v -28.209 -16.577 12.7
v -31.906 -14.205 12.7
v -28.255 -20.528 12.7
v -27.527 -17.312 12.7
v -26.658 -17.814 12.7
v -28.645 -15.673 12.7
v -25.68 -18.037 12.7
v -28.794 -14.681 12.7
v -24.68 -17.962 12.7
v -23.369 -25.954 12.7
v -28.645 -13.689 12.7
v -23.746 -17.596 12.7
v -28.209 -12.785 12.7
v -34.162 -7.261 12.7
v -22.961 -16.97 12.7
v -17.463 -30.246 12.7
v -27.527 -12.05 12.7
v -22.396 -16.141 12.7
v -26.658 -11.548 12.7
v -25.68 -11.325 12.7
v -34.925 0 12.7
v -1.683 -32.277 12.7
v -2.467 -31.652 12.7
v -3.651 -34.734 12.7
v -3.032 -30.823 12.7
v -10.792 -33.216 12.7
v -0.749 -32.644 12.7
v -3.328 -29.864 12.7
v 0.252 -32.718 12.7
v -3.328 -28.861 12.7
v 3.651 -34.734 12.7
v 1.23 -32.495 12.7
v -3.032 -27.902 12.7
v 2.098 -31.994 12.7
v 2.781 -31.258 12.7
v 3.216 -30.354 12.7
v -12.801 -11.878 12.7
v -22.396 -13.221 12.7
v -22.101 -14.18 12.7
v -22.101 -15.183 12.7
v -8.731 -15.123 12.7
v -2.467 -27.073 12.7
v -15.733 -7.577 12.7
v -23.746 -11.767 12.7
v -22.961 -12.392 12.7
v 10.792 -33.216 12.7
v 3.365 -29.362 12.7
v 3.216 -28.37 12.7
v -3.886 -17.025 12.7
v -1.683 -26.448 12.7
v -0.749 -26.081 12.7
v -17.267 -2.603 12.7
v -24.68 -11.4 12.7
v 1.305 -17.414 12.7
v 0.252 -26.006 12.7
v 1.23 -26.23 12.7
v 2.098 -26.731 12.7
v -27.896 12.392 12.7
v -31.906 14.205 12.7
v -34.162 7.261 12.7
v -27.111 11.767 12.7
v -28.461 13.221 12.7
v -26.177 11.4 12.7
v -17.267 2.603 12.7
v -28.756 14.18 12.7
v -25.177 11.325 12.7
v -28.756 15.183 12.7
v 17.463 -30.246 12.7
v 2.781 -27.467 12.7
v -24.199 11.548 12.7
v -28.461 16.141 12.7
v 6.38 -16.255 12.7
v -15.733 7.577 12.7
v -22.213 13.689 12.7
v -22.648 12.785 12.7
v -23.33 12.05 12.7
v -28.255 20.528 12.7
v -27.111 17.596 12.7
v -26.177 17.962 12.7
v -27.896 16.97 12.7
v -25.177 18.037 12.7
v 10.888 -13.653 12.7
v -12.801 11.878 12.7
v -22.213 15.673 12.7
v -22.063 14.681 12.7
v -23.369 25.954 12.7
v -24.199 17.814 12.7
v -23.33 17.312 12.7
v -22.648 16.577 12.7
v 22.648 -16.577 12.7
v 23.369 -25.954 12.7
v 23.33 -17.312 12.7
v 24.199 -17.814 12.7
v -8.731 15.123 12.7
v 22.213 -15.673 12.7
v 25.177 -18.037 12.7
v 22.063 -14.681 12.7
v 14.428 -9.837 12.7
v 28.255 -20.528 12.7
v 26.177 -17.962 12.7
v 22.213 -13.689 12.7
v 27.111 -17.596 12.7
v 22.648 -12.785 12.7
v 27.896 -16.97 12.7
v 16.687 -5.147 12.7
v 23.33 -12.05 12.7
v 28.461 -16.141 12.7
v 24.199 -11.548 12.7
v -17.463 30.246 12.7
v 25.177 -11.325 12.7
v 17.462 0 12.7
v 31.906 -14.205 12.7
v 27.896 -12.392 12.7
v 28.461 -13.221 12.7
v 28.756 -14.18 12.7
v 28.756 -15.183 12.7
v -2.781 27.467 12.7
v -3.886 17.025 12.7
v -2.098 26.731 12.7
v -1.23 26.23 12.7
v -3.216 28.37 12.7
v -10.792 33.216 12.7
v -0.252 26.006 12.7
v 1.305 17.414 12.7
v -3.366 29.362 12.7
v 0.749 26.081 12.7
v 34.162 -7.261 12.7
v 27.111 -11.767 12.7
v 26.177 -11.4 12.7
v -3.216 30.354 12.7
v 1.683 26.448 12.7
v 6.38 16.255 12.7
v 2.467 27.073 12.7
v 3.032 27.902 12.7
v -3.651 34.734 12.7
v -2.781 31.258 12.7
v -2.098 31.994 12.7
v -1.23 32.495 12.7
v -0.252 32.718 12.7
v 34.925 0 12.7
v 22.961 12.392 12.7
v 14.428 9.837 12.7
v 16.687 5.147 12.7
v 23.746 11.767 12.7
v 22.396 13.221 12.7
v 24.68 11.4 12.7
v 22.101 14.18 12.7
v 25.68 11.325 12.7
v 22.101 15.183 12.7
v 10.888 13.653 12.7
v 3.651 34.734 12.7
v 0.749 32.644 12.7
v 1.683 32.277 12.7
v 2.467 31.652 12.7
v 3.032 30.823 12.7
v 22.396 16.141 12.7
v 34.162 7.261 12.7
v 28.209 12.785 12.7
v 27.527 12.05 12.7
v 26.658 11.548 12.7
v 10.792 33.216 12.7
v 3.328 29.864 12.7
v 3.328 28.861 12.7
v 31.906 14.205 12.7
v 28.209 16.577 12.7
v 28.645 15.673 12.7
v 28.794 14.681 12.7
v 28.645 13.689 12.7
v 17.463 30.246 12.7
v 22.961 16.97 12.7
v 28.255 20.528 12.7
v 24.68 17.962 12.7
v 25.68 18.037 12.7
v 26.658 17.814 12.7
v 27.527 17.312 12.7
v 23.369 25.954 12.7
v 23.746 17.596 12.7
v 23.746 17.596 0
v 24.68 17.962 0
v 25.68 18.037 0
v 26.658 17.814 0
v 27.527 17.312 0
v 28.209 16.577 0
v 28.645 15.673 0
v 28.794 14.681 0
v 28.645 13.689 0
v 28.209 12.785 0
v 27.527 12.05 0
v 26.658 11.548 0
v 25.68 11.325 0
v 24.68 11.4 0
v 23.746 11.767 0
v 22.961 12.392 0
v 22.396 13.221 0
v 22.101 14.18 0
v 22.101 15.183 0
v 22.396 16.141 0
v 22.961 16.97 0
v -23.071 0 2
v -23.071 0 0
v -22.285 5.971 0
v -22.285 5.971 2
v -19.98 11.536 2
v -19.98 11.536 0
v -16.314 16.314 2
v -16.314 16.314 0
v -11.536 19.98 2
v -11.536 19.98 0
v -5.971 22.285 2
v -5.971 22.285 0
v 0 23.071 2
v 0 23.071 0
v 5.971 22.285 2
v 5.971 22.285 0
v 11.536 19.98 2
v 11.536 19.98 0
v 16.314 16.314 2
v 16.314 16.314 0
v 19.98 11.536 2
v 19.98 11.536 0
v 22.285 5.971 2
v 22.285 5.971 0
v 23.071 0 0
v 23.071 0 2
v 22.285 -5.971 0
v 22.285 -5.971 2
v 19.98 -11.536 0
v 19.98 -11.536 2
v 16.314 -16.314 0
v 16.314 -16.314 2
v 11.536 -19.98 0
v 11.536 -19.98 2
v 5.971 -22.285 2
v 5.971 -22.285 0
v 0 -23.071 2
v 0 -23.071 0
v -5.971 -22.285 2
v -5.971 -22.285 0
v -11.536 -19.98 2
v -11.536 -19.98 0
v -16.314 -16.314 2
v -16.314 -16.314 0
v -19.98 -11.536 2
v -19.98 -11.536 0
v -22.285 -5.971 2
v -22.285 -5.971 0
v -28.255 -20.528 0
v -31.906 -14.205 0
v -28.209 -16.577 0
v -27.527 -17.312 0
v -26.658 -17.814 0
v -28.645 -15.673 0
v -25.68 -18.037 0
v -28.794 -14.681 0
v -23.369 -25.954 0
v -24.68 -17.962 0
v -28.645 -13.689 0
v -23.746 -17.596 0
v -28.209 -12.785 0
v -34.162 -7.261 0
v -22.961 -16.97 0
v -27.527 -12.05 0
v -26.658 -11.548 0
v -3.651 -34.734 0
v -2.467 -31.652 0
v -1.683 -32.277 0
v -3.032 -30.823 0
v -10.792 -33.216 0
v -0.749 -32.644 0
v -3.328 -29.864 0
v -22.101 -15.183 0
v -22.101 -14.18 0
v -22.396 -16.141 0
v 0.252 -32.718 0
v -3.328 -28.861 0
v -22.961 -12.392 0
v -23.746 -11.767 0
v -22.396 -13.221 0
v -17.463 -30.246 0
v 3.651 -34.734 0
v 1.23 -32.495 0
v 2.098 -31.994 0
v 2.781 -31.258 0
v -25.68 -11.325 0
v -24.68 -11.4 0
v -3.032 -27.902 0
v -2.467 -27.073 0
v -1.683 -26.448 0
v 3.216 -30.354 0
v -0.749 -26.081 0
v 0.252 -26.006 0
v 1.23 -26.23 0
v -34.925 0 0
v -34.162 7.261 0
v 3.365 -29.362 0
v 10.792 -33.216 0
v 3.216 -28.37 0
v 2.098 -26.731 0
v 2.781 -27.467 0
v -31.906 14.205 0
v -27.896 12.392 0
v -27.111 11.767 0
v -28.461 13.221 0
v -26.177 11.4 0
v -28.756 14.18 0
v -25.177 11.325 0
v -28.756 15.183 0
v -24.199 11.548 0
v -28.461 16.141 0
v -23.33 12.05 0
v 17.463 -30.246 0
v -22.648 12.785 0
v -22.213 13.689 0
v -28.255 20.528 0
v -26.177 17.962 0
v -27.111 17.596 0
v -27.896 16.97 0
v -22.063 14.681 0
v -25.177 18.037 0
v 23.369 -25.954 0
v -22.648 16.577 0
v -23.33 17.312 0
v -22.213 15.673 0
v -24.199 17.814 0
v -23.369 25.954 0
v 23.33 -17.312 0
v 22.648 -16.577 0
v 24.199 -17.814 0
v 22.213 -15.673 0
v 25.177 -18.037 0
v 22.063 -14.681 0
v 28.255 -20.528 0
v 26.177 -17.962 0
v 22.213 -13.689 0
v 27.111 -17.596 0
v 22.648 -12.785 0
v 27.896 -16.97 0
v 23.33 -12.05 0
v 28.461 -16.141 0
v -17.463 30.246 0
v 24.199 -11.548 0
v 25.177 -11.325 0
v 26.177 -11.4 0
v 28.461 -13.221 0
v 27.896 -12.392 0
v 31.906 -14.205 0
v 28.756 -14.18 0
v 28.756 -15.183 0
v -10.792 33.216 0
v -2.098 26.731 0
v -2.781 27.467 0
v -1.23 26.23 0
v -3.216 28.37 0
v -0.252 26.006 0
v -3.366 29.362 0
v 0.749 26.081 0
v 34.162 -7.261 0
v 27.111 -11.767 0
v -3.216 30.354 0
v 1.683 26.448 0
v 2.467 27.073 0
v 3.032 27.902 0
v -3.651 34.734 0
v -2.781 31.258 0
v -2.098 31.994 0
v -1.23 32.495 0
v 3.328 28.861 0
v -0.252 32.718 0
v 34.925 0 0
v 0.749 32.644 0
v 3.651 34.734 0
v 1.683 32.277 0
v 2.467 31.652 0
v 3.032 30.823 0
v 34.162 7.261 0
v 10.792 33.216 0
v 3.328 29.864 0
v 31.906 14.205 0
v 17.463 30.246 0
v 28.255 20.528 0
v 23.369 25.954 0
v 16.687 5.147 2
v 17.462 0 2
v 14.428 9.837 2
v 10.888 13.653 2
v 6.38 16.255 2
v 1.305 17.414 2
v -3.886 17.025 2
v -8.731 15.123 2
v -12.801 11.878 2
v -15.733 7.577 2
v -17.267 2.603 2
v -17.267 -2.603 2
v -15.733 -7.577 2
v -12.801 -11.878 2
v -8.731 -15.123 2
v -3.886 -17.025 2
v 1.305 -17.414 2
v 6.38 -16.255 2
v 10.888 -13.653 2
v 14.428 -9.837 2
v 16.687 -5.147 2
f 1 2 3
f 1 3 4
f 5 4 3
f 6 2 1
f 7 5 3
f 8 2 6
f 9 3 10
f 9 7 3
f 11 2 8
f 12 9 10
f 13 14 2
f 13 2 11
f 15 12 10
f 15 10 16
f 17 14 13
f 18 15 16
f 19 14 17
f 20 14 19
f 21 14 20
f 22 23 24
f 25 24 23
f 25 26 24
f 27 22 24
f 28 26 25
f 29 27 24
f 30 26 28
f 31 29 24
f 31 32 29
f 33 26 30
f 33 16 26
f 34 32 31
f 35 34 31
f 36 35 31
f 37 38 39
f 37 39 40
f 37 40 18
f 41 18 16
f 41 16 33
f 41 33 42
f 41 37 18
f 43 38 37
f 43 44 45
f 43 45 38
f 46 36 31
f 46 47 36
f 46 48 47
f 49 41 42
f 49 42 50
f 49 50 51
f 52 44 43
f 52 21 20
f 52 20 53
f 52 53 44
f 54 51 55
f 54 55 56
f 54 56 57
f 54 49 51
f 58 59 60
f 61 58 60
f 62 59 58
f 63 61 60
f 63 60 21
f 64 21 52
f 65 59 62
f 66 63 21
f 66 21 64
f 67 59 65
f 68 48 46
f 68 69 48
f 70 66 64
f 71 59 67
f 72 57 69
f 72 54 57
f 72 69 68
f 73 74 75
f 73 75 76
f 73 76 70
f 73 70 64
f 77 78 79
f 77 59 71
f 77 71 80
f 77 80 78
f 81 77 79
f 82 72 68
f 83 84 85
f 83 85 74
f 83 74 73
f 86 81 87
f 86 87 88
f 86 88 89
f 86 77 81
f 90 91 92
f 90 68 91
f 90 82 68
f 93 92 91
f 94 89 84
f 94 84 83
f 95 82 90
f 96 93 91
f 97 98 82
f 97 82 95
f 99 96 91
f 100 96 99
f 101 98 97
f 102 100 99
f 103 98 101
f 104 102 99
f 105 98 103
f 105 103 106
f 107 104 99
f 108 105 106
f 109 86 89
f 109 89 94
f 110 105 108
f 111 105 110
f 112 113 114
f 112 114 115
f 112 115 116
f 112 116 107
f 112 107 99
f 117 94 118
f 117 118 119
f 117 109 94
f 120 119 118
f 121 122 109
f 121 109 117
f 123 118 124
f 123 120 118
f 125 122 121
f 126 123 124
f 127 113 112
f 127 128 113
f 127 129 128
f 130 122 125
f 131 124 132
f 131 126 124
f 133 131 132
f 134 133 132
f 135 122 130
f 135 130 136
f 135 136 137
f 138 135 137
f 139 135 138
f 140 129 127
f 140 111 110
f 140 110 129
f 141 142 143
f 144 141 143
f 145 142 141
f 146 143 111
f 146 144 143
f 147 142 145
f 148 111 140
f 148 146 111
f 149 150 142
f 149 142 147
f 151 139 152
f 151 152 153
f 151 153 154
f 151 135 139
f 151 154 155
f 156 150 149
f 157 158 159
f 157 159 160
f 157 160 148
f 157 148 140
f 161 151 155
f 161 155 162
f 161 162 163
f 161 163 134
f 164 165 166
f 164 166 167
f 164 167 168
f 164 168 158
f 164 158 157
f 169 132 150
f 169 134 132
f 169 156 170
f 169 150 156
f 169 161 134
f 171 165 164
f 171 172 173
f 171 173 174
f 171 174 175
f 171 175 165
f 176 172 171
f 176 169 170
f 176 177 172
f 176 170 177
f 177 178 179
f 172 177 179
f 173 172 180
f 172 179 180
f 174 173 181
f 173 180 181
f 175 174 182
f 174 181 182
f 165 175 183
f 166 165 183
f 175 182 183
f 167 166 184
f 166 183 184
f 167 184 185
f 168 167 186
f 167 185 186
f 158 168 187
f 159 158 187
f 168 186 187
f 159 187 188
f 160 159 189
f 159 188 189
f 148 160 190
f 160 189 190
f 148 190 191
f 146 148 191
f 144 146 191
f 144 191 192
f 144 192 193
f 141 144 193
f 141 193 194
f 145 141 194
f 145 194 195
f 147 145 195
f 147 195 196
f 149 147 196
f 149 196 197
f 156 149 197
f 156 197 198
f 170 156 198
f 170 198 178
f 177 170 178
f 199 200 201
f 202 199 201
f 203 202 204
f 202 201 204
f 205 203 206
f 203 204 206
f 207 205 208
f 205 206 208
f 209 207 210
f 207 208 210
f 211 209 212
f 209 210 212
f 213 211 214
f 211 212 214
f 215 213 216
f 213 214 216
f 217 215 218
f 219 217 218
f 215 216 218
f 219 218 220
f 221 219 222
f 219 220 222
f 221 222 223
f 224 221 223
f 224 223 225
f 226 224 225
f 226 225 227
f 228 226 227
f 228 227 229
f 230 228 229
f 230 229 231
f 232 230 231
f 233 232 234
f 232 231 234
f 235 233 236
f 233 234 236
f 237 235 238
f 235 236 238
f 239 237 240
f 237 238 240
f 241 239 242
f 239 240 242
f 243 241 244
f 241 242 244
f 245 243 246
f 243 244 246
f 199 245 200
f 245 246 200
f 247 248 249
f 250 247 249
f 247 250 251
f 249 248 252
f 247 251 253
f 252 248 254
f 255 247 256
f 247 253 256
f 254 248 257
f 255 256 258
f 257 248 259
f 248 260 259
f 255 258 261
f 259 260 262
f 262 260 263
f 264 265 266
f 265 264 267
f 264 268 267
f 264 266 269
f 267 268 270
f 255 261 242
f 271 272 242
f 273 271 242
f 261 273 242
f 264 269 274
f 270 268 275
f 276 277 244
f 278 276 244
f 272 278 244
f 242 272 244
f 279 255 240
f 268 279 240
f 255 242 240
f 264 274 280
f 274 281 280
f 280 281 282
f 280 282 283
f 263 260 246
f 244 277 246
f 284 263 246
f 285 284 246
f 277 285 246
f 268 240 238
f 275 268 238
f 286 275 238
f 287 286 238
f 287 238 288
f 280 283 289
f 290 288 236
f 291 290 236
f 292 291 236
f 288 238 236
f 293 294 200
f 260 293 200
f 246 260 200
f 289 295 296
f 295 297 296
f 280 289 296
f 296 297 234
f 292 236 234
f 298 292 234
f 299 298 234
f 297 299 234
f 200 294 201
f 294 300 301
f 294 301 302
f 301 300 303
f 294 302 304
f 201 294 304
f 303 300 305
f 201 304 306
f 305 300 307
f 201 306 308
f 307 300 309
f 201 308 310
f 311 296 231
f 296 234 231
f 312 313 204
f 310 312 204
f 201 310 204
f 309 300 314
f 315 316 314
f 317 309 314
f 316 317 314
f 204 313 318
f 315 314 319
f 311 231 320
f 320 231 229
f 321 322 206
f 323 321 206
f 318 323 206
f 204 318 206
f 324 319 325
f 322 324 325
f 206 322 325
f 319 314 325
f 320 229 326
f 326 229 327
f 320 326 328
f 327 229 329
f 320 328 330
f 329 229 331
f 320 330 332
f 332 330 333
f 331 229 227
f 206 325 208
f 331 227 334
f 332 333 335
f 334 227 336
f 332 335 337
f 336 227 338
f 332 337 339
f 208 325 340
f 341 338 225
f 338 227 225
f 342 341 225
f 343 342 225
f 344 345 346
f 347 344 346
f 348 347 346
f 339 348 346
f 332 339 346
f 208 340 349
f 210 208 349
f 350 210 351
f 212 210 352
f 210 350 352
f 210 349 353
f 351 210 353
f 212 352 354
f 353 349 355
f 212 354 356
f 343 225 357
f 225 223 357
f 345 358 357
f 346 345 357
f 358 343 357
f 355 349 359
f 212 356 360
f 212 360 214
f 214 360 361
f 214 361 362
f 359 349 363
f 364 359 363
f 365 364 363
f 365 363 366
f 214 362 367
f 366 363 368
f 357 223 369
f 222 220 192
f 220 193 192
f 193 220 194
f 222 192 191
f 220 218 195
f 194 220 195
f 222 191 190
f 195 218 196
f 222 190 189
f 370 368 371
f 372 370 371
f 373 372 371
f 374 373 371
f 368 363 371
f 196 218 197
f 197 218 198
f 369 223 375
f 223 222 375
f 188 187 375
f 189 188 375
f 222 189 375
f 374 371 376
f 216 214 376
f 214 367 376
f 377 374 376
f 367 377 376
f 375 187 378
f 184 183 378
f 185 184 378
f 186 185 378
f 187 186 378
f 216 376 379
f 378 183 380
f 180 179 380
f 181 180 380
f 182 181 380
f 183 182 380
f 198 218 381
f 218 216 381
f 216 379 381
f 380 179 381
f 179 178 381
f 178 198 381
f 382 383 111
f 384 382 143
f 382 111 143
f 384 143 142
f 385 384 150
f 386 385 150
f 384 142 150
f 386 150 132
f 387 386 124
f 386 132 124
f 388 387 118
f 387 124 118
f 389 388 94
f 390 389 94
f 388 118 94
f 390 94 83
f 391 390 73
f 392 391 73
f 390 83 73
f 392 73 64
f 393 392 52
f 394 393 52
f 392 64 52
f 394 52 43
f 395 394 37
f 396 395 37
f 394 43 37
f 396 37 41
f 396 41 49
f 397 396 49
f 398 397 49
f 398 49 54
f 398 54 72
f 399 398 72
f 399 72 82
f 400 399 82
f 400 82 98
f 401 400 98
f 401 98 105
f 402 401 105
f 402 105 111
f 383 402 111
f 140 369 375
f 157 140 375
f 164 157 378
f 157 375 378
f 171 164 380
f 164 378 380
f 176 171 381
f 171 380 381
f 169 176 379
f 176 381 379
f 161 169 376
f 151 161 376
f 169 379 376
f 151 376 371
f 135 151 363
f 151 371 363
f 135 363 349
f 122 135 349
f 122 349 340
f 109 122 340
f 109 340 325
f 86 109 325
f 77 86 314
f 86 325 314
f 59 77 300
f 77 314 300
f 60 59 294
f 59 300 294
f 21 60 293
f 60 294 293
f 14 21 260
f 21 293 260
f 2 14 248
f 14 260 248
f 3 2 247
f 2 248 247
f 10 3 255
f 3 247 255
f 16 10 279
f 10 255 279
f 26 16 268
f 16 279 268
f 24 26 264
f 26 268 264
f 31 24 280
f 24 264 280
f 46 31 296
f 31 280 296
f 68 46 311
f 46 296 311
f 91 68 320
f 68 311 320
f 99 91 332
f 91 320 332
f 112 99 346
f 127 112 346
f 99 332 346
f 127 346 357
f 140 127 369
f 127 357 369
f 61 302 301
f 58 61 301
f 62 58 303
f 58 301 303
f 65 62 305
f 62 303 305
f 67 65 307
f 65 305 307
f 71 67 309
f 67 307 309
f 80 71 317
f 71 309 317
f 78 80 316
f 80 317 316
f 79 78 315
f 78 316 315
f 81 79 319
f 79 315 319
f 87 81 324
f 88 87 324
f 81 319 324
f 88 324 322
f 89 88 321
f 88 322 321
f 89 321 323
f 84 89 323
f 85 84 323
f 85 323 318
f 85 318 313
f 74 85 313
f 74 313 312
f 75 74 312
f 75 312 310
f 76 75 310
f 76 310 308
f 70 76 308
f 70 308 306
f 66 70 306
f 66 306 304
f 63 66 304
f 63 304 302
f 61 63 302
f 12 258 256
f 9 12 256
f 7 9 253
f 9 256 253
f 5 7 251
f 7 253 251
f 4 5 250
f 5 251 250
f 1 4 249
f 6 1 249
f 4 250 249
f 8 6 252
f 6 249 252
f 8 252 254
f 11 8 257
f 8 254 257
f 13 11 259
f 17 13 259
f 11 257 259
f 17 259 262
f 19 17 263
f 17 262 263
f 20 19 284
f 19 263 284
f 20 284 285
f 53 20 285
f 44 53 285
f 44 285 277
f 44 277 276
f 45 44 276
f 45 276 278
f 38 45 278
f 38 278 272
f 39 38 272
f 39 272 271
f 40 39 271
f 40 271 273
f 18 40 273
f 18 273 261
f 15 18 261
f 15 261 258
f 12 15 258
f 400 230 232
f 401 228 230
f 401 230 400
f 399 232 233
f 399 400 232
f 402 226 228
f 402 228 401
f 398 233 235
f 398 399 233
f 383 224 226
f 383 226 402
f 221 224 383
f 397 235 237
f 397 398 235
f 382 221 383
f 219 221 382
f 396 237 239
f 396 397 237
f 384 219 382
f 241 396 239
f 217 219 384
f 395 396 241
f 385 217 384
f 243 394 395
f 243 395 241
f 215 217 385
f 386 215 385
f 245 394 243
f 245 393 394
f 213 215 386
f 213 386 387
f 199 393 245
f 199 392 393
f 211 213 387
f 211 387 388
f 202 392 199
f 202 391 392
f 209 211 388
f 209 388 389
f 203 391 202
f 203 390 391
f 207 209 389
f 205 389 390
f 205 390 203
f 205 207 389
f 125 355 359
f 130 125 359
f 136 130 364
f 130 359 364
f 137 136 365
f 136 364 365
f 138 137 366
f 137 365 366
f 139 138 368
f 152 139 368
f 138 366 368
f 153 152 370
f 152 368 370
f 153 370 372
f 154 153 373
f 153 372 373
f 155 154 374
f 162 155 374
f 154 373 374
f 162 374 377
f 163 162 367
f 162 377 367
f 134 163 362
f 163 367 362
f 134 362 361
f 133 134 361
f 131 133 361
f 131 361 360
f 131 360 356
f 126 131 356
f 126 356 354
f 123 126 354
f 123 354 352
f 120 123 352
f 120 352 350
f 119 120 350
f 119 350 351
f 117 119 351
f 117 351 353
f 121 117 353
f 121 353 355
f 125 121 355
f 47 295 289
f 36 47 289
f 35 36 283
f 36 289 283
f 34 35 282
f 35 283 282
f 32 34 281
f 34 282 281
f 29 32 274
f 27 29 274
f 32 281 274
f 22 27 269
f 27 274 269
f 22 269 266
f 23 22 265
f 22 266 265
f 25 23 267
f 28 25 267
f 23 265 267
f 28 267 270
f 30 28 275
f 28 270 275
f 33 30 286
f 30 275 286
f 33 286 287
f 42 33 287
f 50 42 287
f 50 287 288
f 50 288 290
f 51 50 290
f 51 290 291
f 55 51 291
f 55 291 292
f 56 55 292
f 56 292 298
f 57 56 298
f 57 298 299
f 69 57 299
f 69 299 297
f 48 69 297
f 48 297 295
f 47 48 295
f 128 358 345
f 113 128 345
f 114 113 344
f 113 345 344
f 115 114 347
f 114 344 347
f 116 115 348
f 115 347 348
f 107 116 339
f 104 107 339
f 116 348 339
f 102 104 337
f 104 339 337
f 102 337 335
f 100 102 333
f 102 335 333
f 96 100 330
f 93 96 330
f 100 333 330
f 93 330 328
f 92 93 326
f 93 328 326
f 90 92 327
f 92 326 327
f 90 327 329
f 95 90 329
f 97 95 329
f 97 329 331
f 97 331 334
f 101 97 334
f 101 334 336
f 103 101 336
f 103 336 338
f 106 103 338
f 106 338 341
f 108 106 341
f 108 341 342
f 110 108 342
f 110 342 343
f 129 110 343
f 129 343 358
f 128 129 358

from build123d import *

# Parameters (mm, degrees)
SKETCH1_R          = 34.925
SKETCH1_R_2        = 8
BASE_EXTRUDE_DEPTH = 12.7
SKETCH6_R          = 3.3655
CUT_EXTRUDE1_DEPTH = 51.998051433
CIRPATTERN2_COUNT  = 6
SKETCH11_R         = 23.07124837
CUT_EXTRUDE3_DEPTH = 2
SKETCH12_R         = 11.5
CUT_EXTRUDE4_DEPTH = 2
SKETCH14_R         = 17.4625
CUT_EXTRUDE5_DEPTH = 51.998051433


with BuildPart() as part:
    # Sketch1 → Base-Extrude (new body)
    with BuildSketch(Plane.XY):
        Circle(SKETCH1_R)
        Circle(SKETCH1_R_2, mode=Mode.SUBTRACT)
    extrude(amount=BASE_EXTRUDE_DEPTH)

    # Sketch6 → Cut-Extrude1 (cut, through all)
    with BuildSketch(Plane(origin=(0, 0, 0), x_dir=(-1, 0, 0), z_dir=(0, 0, -1))):
        with Locations((0, 29.3624)):
            Circle(SKETCH6_R)
    cut_extrude1 = extrude(amount=-CUT_EXTRUDE1_DEPTH, mode=Mode.SUBTRACT)

    # CirPattern2: Cut-Extrude1 ×6 about axis
    cirpattern2_axis = Axis((0, 0, 0), (0, 0, 1))
    for i in range(1, CIRPATTERN2_COUNT):
        add(cut_extrude1.rotate(cirpattern2_axis, i * 360 / CIRPATTERN2_COUNT), mode=Mode.SUBTRACT)

    # Sketch11 → Cut-Extrude3 (cut)
    with BuildSketch(Plane(origin=(0, 0, 0), x_dir=(-1, 0, 0), z_dir=(0, 0, -1))):
        Circle(SKETCH11_R)
    extrude(amount=-CUT_EXTRUDE3_DEPTH, mode=Mode.SUBTRACT)

    # Sketch12 → Cut-Extrude4 (cut)
    with BuildSketch(Plane.XY.offset(12.7)):
        Circle(SKETCH12_R)
    extrude(amount=-CUT_EXTRUDE4_DEPTH, mode=Mode.SUBTRACT)

    # Sketch14 → Cut-Extrude5 (cut, through all)
    with BuildSketch(Plane.XY.offset(12.7)):
        Circle(SKETCH14_R)
    extrude(amount=-CUT_EXTRUDE5_DEPTH, mode=Mode.SUBTRACT)


solid = part.part
